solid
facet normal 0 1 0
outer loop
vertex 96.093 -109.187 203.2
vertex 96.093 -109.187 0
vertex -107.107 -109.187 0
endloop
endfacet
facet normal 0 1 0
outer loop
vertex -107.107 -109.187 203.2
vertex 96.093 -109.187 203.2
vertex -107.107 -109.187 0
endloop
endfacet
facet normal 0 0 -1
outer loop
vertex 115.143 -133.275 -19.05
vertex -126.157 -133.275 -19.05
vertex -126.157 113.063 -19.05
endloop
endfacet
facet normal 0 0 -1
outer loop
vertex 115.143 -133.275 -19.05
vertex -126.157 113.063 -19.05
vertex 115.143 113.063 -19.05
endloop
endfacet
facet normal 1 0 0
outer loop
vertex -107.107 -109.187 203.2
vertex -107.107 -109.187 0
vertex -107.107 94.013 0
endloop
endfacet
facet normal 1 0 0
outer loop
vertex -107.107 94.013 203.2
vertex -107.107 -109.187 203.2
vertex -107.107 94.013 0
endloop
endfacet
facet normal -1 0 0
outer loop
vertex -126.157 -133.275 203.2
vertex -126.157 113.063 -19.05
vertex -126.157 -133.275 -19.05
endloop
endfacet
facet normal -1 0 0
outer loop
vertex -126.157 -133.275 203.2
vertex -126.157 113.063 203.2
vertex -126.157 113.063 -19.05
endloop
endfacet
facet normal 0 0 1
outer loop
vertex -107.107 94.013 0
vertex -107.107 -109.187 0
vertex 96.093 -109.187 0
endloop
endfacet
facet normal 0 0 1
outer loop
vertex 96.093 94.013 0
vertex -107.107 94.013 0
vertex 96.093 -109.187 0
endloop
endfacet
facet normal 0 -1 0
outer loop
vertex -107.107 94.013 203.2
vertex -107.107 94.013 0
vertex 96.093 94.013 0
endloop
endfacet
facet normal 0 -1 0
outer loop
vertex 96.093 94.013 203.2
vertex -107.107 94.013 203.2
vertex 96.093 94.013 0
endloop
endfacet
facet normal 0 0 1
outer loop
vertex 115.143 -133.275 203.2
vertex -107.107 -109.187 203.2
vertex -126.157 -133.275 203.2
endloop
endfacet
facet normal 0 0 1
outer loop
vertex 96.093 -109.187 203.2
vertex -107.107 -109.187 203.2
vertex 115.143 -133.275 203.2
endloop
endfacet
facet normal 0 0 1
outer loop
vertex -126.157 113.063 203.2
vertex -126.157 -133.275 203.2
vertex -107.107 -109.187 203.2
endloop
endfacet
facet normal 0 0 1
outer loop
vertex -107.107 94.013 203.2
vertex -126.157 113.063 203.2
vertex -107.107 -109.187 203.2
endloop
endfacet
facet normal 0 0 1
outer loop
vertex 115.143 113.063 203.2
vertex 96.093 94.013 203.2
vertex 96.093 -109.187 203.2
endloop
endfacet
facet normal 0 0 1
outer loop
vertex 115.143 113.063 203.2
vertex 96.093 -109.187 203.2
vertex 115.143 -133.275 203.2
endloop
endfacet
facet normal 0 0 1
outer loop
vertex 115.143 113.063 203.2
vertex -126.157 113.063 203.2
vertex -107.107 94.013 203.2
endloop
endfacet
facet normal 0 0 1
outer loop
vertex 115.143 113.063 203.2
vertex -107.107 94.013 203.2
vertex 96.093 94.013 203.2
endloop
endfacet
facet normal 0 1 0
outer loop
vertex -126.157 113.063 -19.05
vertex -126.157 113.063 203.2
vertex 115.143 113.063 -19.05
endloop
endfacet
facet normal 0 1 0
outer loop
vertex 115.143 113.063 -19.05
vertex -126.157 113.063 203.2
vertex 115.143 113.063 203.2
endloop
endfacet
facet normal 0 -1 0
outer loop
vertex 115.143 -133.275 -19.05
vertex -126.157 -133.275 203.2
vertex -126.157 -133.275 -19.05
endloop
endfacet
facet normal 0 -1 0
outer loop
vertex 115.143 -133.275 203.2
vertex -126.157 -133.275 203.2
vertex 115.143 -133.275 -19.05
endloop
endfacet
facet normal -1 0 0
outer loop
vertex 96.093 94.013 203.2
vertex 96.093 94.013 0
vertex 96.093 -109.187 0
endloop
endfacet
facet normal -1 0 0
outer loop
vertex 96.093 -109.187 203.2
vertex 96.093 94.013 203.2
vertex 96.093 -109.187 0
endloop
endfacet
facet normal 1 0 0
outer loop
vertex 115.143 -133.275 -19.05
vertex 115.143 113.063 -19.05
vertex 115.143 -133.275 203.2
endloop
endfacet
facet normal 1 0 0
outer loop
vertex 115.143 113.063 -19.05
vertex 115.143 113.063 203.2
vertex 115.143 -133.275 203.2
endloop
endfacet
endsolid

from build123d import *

# Parameters (mm, degrees)
F1_DEPTH = 203.2
F2_W     = 241.3
F2_H     = 246.338792
F3_DEPTH = 19.05


with BuildPart() as f1:
    # F0 (on Top) → F1 (new body)
    with BuildSketch(Plane.XY):
        Polygon((-107.106747, -109.186523), (-107.106747, -9.808976), (-126.156747, -9.808976), (-126.156747, -133.275315), (115.143253, -133.275315), (115.143253, -7.586523), (96.093253, -7.586523), (96.093253, -109.186523), align=None)
        Polygon((-107.106747, -9.808976), (-107.106747, 94.013477), (-2.590392, 94.013477), (-2.590392, 113.063477), (-126.156747, 113.063477), (-126.156747, -9.808976), align=None)
        Polygon((-2.590392, 113.063477), (-2.590392, 94.013477), (96.093253, 94.013477), (96.093253, -7.586523), (115.143253, -7.586523), (115.143253, 113.063477), align=None)
    extrude(amount=F1_DEPTH)

    # F2 (on face) → F3 (join)
    with BuildSketch(Plane(origin=(0, 0, 0), x_dir=(1, 0, 0), z_dir=(0, 0, -1))):
        with Locations((-5.506747, 10.105919)):
            Rectangle(F2_W, F2_H)
    extrude(amount=F3_DEPTH)


solid = f1.part
